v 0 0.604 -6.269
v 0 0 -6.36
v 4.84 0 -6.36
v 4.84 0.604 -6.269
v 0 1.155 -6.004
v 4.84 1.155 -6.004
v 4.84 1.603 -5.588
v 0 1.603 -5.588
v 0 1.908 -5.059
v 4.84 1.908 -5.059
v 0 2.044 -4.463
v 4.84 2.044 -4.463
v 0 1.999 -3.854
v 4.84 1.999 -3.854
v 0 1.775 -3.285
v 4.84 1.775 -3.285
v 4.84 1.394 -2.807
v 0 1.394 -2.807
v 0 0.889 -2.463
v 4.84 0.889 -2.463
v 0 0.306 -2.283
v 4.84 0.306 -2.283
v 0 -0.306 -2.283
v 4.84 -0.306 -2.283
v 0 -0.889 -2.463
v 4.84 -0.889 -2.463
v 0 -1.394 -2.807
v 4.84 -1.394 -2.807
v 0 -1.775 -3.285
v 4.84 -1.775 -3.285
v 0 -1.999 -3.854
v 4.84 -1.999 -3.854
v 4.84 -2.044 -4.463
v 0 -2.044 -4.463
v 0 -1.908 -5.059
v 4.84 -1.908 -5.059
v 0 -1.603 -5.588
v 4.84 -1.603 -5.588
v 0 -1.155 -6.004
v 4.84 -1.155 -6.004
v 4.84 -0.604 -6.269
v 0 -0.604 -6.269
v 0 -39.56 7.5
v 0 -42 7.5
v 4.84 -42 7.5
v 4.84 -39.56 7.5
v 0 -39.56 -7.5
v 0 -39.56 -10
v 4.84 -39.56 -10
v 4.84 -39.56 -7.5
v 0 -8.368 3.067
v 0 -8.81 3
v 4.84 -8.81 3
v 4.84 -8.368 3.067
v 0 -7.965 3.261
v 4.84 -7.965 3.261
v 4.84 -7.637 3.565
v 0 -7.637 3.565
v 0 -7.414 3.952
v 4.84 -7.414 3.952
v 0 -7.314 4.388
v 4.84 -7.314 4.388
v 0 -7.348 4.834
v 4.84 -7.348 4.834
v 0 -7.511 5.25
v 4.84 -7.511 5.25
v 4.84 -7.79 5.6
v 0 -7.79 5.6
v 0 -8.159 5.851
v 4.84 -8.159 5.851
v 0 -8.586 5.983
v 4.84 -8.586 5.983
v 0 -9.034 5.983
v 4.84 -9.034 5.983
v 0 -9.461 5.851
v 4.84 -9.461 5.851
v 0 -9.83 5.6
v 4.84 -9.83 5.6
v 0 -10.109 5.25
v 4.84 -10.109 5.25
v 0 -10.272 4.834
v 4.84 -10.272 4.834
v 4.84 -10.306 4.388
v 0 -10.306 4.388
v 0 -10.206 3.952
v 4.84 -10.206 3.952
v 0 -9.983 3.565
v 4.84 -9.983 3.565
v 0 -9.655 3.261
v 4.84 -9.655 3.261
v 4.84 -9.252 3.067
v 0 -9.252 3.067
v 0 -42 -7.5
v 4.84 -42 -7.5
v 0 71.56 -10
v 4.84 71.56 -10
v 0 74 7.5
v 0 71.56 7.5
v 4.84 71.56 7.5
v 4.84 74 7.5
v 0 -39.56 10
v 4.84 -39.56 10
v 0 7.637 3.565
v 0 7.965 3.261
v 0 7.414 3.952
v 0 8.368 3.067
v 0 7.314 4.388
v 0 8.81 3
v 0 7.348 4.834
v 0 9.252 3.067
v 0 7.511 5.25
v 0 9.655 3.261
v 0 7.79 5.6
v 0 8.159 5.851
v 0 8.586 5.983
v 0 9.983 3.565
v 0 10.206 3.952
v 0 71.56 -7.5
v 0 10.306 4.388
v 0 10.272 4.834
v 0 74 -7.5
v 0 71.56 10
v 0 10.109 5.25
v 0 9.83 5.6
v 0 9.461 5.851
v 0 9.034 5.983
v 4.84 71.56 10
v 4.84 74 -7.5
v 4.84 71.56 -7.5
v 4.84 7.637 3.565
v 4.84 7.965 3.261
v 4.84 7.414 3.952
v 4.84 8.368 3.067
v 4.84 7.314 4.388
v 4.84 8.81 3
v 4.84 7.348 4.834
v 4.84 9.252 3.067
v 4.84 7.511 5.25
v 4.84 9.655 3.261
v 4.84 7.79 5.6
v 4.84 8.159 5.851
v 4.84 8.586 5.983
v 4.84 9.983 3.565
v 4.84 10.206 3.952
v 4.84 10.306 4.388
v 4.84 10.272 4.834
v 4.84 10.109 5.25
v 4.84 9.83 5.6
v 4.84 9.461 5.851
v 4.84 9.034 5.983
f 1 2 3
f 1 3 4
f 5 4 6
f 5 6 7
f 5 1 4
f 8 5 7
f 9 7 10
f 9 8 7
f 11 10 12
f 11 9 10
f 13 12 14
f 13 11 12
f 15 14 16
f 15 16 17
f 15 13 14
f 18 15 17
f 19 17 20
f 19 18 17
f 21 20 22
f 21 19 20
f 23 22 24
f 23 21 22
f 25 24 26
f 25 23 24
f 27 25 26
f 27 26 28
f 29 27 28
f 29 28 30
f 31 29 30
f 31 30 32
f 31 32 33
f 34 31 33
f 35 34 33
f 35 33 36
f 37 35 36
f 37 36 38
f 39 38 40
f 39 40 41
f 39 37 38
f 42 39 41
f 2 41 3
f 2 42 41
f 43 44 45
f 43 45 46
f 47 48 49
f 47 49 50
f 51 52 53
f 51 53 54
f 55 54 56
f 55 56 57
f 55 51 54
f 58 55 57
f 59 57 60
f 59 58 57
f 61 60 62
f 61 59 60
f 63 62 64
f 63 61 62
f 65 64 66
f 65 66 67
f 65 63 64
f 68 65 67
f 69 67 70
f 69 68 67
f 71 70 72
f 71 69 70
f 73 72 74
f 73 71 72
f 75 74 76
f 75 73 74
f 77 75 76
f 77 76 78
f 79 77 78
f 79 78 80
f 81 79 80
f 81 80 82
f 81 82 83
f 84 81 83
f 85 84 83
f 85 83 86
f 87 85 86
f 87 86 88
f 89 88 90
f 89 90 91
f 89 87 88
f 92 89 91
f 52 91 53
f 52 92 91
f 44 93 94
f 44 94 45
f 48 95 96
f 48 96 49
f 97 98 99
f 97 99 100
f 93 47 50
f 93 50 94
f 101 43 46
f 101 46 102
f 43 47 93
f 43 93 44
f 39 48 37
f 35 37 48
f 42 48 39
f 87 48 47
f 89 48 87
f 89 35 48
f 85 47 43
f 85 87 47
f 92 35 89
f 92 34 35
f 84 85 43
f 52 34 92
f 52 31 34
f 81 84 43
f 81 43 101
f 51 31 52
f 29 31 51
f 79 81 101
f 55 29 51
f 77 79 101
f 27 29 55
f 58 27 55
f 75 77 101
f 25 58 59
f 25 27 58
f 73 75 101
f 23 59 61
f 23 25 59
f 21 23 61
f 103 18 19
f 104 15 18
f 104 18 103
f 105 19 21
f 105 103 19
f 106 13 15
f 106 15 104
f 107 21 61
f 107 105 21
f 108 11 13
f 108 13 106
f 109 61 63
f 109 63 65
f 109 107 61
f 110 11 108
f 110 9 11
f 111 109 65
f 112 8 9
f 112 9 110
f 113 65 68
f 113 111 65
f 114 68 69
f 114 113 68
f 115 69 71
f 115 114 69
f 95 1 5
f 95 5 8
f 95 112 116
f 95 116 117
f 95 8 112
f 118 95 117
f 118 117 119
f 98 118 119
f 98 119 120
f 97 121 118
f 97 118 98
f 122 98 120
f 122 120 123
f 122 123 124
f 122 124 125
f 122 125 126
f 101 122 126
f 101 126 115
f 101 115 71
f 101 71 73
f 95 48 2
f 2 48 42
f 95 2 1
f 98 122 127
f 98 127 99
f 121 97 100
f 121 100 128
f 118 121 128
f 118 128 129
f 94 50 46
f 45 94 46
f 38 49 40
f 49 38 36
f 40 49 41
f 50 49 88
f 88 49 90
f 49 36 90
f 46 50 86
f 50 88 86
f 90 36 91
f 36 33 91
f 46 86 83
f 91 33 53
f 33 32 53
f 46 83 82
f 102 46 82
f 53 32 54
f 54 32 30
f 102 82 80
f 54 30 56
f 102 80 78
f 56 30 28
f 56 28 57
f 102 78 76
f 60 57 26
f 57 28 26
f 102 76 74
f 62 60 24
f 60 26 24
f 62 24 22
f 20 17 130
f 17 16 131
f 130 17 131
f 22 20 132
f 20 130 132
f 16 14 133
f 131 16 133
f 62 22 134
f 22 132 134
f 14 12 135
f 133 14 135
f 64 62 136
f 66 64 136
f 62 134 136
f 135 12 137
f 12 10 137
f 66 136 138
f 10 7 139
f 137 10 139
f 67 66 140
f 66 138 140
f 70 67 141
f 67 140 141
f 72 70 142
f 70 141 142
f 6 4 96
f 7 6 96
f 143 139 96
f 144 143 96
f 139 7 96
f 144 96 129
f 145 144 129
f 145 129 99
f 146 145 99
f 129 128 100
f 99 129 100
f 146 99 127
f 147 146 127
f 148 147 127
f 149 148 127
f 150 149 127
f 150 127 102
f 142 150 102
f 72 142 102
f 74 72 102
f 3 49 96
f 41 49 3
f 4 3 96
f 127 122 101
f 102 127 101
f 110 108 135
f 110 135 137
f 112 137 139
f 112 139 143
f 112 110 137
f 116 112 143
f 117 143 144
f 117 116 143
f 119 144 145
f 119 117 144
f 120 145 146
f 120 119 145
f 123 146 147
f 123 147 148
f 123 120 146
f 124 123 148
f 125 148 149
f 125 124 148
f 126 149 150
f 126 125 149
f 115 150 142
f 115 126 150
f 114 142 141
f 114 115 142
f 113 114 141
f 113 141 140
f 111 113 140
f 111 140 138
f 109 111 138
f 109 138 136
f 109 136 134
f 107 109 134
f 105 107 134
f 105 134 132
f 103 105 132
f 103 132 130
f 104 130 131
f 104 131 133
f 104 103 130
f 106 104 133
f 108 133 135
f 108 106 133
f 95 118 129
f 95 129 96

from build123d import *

# Parameters (mm, degrees)
CROQUIS1_R              = 2.05
CROQUIS1_R_2            = 1.5
SALIENTE_EXTRUIR1_DEPTH = 4.84


with BuildPart() as part:
    # Croquis1 → Saliente-Extruir1 (new body)
    with BuildSketch(Plane(origin=(0, 0, 0), x_dir=(0, 0, -1), z_dir=(1, 0, 0))):
        Polygon((-10, 0), (-10, 71.56), (-7.5, 71.56), (-7.5, 74), (7.5, 74), (7.5, 71.56), (10, 71.56), (10, -39.56), (7.5, -39.56), (7.5, -42), (-7.5, -42), (-7.5, -39.56), (-10, -39.56), align=None)
        with Locations((4.31, 0)):
            Circle(CROQUIS1_R, mode=Mode.SUBTRACT)
        with Locations((-4.5, 8.81)):
            Circle(CROQUIS1_R_2, mode=Mode.SUBTRACT)
        with Locations((-4.5, -8.81)):
            Circle(CROQUIS1_R_2, mode=Mode.SUBTRACT)
    extrude(amount=SALIENTE_EXTRUIR1_DEPTH)


solid = part.part
